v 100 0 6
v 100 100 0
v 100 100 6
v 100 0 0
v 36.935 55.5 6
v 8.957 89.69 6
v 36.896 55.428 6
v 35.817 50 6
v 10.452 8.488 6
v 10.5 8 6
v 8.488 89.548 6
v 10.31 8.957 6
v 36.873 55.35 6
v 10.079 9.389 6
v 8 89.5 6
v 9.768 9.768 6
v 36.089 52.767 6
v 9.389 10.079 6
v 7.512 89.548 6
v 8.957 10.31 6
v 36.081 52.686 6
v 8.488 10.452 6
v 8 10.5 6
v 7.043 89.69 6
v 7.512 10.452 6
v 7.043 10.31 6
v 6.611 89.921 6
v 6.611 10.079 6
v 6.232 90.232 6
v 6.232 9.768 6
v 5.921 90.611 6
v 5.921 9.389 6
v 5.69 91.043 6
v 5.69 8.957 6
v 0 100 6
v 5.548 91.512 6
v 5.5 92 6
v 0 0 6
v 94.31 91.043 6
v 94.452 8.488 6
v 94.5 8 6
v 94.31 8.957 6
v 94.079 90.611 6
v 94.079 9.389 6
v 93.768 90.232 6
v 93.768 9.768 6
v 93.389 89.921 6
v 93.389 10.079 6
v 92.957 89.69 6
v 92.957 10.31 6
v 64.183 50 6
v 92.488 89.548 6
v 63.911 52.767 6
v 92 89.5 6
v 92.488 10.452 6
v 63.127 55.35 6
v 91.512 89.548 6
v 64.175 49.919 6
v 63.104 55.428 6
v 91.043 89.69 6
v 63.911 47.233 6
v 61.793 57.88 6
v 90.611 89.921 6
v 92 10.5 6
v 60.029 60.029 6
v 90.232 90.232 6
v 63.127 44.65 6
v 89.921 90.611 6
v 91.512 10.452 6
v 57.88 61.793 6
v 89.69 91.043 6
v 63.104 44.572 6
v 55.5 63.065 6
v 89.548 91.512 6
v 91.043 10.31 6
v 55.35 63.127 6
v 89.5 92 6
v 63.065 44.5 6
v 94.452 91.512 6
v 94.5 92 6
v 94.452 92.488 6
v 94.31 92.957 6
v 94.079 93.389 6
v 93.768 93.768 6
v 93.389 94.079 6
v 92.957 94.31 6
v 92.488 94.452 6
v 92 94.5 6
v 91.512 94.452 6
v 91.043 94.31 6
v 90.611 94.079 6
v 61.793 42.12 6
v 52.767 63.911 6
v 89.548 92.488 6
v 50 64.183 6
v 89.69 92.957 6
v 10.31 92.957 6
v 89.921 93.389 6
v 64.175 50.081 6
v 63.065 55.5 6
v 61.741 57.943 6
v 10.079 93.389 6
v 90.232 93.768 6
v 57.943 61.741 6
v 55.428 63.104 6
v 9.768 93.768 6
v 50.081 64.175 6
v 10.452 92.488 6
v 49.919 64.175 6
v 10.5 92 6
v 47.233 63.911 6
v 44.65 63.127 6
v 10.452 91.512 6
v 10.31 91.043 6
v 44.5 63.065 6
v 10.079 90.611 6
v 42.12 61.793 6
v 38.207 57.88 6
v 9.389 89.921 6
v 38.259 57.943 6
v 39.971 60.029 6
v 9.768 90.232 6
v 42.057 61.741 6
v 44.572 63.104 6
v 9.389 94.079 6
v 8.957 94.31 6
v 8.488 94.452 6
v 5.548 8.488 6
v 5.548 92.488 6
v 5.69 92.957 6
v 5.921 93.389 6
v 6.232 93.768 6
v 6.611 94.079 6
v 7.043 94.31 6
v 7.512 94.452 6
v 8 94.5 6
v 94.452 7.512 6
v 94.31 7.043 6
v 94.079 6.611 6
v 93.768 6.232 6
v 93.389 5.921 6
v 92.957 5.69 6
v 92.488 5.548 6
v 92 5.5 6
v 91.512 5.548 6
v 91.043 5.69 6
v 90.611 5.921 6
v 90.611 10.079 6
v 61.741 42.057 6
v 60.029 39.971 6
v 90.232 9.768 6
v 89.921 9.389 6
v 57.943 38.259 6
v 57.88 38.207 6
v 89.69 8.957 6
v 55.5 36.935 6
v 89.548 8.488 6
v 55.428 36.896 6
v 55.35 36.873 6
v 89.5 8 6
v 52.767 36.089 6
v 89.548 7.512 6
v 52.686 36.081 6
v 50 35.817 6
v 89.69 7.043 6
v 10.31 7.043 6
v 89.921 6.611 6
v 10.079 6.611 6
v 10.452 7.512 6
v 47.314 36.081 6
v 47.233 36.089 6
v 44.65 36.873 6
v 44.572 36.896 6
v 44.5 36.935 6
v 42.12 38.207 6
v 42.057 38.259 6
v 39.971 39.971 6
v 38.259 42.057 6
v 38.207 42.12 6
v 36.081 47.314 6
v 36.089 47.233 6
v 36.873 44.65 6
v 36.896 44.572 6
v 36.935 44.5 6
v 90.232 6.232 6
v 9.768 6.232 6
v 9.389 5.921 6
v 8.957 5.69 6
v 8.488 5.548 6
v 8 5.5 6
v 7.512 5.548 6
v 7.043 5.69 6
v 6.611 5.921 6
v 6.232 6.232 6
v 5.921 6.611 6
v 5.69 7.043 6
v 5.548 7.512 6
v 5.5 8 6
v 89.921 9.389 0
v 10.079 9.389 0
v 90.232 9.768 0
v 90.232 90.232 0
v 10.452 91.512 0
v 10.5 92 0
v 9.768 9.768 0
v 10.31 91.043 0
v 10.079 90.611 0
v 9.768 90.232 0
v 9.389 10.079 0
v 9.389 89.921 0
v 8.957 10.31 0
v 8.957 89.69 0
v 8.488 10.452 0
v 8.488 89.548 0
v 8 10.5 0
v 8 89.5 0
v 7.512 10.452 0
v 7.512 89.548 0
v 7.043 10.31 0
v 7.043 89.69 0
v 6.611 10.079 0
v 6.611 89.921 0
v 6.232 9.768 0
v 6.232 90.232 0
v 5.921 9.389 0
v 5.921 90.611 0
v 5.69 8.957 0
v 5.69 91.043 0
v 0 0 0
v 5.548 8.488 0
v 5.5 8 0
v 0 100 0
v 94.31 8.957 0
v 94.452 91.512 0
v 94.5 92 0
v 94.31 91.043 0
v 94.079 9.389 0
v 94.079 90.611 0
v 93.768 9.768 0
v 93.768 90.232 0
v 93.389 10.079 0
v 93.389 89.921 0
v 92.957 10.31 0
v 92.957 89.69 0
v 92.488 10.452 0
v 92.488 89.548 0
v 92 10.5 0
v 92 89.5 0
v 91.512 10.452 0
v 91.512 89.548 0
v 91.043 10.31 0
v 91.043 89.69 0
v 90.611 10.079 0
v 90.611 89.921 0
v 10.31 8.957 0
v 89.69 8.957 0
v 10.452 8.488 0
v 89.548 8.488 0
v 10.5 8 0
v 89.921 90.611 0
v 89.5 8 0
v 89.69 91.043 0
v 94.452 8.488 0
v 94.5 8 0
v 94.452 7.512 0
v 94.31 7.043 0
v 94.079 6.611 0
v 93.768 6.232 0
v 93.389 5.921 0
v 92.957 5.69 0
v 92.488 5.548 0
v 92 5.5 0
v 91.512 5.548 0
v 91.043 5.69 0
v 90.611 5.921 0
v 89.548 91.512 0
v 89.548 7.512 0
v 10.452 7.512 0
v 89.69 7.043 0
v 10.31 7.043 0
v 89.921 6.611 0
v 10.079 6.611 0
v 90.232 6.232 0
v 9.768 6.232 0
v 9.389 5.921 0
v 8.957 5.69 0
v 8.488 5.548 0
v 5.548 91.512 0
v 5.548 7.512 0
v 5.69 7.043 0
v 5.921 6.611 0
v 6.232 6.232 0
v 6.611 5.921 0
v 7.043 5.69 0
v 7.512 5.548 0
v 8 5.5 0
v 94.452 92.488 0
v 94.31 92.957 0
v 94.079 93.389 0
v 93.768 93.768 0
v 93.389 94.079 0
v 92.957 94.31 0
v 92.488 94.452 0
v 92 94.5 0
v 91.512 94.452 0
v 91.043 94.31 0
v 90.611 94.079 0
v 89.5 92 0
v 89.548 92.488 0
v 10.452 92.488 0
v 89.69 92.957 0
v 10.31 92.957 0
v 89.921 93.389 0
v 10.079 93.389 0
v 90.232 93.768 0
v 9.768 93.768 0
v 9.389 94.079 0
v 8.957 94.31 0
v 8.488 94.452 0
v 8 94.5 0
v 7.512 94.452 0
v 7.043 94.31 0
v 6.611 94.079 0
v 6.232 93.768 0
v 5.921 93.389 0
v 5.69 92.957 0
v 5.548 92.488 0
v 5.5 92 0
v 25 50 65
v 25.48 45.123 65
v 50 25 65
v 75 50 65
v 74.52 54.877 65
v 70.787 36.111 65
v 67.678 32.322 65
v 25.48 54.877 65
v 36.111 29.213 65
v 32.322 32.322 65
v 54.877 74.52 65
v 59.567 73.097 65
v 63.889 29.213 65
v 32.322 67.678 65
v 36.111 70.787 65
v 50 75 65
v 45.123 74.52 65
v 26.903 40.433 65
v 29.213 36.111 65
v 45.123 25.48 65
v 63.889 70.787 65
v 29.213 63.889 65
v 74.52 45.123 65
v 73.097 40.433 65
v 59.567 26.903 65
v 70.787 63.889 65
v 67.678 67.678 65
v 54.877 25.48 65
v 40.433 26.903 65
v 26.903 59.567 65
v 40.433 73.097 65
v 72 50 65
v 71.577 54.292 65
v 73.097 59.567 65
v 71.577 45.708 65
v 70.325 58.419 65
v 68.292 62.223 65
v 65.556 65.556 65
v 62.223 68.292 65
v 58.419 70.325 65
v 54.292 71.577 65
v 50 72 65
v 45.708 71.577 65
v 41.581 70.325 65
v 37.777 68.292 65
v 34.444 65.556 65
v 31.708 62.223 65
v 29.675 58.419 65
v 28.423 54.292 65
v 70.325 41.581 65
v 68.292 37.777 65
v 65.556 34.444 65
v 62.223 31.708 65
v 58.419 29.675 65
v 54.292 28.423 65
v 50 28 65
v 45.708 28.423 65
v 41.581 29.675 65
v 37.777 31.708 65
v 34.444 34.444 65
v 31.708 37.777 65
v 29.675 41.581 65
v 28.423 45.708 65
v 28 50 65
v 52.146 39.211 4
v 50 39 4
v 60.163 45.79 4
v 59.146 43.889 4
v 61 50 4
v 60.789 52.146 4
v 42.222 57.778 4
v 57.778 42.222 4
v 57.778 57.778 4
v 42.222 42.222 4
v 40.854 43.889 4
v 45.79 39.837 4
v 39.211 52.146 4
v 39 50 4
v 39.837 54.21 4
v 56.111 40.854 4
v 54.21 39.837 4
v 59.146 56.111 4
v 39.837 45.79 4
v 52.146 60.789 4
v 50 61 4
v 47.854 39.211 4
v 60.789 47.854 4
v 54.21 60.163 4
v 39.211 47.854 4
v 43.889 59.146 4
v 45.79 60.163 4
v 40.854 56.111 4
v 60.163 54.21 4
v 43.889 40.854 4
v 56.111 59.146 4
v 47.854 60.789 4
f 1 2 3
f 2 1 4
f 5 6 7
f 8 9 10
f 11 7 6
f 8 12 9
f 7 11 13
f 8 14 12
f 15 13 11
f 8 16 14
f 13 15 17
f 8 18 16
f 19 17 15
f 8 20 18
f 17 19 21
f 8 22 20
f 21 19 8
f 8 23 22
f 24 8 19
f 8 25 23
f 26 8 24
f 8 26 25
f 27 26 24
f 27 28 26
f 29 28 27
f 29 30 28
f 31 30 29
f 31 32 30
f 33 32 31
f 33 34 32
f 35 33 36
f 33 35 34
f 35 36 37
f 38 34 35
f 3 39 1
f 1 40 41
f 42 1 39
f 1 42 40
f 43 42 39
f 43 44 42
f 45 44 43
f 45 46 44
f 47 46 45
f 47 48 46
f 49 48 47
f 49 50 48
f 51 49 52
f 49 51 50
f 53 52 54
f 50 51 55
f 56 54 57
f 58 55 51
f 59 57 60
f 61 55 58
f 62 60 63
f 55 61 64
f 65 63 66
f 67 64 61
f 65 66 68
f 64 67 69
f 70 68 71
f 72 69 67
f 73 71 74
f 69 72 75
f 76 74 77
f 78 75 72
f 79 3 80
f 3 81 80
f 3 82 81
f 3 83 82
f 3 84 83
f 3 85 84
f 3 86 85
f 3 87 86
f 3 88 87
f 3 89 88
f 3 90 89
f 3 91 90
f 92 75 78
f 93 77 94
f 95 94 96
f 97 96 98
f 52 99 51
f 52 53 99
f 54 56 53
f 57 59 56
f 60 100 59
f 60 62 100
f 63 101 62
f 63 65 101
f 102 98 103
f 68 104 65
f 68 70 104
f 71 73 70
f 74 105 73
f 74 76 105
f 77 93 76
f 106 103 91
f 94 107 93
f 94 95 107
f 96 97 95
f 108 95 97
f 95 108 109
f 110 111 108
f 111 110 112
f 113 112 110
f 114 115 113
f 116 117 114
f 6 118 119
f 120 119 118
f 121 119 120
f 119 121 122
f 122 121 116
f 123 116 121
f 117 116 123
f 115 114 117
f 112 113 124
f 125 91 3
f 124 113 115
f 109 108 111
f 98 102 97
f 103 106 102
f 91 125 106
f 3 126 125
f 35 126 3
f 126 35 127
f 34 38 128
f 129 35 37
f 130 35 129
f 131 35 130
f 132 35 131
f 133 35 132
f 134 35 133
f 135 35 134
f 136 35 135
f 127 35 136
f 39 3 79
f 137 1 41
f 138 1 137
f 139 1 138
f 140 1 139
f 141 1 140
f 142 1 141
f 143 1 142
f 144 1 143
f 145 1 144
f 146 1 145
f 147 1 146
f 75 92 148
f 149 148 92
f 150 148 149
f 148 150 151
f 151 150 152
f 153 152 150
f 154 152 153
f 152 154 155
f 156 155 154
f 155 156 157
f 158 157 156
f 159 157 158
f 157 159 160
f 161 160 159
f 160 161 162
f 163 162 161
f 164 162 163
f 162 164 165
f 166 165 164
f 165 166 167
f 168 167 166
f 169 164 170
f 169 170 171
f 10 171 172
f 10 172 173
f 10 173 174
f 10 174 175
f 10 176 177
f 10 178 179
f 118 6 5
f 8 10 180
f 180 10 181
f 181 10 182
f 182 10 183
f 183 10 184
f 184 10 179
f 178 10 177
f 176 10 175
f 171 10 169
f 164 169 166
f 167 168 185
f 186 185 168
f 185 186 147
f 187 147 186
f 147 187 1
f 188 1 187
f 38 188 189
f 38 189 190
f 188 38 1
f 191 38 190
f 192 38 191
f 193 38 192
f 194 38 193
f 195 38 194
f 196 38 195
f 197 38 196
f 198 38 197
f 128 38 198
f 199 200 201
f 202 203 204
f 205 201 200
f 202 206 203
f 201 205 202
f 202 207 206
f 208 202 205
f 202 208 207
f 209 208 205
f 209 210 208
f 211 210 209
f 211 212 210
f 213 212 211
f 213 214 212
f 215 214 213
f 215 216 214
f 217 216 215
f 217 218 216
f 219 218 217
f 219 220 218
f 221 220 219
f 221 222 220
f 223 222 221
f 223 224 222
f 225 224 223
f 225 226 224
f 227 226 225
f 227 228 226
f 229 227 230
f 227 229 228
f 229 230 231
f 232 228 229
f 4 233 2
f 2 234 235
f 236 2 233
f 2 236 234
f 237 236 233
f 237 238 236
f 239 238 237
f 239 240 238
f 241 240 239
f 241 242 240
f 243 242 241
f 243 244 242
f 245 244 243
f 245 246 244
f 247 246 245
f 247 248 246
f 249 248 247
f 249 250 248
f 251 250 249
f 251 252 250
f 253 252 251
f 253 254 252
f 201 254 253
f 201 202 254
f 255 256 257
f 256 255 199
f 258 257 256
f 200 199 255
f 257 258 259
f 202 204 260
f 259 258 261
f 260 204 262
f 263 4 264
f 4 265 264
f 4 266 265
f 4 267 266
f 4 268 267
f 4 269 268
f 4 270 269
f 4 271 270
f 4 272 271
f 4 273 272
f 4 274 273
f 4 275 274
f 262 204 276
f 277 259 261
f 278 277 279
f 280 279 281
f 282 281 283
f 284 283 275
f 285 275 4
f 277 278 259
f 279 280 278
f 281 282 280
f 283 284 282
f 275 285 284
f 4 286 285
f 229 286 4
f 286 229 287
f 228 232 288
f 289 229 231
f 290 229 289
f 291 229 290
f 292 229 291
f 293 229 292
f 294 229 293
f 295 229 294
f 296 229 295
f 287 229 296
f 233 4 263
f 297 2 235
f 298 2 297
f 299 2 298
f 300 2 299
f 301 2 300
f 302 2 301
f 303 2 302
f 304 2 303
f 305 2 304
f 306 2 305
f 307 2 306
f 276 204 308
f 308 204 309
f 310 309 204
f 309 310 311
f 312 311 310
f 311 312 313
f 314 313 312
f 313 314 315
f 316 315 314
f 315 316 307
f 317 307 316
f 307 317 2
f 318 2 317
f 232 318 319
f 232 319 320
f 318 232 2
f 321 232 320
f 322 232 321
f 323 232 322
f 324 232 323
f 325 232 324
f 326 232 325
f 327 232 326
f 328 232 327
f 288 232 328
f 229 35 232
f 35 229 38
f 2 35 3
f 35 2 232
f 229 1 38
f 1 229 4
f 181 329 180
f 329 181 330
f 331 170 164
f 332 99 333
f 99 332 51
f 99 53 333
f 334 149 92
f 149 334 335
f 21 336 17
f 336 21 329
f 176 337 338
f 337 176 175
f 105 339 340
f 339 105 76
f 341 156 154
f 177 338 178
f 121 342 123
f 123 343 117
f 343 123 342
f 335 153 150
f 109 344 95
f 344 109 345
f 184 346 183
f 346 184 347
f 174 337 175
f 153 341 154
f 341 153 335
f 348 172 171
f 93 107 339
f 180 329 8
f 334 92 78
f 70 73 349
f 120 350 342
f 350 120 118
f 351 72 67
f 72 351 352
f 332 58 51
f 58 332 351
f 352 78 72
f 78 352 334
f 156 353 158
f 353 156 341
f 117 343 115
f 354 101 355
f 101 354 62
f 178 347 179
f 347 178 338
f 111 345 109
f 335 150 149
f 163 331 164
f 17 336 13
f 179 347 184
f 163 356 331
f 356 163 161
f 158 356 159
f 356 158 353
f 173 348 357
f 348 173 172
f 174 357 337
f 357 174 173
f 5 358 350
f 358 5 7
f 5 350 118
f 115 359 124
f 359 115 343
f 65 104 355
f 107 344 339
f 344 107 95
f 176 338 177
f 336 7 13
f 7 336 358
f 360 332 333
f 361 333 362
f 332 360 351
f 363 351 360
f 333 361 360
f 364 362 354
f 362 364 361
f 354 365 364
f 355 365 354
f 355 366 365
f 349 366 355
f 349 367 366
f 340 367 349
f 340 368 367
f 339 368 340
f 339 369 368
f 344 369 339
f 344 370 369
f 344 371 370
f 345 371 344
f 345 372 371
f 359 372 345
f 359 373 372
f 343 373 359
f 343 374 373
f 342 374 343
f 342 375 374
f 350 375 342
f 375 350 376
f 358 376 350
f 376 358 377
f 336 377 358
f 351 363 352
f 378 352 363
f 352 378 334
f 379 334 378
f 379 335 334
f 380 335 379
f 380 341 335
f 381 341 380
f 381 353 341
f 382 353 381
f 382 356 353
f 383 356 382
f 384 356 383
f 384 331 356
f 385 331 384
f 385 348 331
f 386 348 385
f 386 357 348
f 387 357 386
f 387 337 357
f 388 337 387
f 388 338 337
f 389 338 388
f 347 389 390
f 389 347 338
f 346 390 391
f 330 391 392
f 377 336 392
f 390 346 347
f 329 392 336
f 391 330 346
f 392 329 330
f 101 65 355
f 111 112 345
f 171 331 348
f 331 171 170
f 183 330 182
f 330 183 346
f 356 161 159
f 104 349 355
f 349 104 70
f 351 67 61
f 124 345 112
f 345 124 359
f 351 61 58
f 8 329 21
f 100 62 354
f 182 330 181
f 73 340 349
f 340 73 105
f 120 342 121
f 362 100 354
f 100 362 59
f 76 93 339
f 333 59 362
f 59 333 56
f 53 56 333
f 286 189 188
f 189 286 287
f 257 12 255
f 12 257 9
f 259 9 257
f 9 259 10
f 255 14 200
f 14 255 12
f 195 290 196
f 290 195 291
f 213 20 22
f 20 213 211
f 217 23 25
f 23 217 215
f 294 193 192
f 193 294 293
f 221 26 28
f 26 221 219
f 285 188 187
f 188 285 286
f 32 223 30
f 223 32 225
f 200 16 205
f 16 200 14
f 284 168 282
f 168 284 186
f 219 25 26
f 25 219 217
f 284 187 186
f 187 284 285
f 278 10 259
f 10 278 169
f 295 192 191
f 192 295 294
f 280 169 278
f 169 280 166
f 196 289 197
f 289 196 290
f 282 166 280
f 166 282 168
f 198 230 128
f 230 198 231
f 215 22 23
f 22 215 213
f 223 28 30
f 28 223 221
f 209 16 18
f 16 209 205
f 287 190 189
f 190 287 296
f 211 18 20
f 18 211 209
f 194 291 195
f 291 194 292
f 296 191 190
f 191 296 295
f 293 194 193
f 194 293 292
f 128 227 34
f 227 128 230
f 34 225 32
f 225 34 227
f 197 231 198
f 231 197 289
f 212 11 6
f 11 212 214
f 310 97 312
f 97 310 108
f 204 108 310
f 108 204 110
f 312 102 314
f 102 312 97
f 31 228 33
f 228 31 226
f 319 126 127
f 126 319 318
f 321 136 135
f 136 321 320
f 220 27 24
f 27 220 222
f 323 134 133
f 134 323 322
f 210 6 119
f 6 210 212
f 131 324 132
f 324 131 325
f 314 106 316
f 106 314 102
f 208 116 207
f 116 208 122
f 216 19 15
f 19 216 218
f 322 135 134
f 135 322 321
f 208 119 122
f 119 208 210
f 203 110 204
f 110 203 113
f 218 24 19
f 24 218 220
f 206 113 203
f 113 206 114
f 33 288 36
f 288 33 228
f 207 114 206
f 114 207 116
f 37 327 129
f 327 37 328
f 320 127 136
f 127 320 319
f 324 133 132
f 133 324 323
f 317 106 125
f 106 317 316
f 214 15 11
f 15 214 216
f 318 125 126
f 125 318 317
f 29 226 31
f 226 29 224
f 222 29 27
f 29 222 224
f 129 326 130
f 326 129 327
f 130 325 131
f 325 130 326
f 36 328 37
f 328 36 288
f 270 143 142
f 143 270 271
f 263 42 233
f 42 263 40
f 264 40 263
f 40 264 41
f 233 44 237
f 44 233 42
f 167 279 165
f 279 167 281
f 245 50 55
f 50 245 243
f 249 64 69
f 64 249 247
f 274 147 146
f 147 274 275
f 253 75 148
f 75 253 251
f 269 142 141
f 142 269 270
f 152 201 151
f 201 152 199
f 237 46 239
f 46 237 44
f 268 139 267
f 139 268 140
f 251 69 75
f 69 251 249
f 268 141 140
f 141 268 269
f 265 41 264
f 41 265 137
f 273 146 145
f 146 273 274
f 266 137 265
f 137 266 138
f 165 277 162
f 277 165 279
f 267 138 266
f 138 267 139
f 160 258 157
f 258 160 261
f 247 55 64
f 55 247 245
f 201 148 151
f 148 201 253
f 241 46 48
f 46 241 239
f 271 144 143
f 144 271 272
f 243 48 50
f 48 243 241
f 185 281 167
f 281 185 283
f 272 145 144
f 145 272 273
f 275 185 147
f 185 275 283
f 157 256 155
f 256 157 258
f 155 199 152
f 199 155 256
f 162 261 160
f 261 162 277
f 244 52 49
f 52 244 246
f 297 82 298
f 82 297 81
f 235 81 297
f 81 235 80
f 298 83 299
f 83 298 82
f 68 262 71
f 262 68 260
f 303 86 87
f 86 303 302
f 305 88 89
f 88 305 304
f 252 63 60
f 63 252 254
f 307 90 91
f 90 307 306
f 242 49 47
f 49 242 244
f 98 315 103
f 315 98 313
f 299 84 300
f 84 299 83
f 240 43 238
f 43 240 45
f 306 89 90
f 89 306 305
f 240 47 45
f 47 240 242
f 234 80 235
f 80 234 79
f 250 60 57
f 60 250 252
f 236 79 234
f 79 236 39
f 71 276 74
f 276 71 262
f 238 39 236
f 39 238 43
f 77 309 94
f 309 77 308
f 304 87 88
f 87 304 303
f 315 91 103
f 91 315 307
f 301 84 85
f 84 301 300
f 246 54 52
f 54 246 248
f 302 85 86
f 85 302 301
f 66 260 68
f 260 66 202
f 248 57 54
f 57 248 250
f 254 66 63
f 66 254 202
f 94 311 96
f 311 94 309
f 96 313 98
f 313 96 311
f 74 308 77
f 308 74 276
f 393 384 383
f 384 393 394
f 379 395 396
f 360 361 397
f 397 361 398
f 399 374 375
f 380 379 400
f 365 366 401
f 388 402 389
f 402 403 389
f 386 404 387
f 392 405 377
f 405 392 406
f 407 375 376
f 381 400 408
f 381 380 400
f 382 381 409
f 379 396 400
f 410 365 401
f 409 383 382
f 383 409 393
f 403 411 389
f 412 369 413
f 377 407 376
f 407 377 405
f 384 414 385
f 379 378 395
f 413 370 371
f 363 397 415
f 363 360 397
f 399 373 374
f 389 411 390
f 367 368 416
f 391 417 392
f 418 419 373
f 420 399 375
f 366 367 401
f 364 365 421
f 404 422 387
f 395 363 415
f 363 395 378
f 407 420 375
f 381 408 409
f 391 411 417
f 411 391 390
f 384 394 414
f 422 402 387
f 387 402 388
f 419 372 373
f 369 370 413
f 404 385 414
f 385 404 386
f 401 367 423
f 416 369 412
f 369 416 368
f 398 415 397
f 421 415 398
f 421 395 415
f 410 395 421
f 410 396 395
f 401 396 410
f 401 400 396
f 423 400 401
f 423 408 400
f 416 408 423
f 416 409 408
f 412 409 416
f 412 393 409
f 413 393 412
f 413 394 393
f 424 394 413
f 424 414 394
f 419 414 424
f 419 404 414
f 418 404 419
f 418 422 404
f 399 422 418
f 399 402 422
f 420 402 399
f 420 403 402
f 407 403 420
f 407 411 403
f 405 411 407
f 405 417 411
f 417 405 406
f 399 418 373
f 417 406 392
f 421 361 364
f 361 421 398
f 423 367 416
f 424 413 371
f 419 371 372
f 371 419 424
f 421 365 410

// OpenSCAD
$fn = 32;

// ----------------------------------------------------------------------
// Hopper: flanged with square flange
// ----------------------------------------------------------------------

// --- parameters (mm) ---
fl = 100;                 // flange side, X and Y
fl_t = 6;                 // flange thickness
cone_h = 60;              // cone height above the flange
top_d = 50;               // cone mouth diameter
bot_d = 28;               // cone spout diameter
wall = 3;                 // cone wall thickness
hole_r = 2.5;             // flange hole radius
hole_in = 8;              // hole inset from the corners

bore_d = bot_d - 2 * wall;  // spout bore diameter
total_h = fl_t + cone_h - 1;  // overall height

difference() {
  union() {
    cube([fl, fl, fl_t]);
    translate([fl / 2, fl / 2, fl_t - 1])
      cylinder(h = cone_h, d1 = bot_d, d2 = top_d);
  }
  translate([fl / 2, fl / 2, fl_t - 2])
    cylinder(h = cone_h + 1, d1 = bore_d, d2 = top_d - 2 * wall);
  for (sx = [0, 1], sy = [0, 1])
    translate([sx ? fl - hole_in : hole_in,
               sy ? fl - hole_in : hole_in, -1])
      cylinder(r = hole_r, h = fl_t + 2);
}
